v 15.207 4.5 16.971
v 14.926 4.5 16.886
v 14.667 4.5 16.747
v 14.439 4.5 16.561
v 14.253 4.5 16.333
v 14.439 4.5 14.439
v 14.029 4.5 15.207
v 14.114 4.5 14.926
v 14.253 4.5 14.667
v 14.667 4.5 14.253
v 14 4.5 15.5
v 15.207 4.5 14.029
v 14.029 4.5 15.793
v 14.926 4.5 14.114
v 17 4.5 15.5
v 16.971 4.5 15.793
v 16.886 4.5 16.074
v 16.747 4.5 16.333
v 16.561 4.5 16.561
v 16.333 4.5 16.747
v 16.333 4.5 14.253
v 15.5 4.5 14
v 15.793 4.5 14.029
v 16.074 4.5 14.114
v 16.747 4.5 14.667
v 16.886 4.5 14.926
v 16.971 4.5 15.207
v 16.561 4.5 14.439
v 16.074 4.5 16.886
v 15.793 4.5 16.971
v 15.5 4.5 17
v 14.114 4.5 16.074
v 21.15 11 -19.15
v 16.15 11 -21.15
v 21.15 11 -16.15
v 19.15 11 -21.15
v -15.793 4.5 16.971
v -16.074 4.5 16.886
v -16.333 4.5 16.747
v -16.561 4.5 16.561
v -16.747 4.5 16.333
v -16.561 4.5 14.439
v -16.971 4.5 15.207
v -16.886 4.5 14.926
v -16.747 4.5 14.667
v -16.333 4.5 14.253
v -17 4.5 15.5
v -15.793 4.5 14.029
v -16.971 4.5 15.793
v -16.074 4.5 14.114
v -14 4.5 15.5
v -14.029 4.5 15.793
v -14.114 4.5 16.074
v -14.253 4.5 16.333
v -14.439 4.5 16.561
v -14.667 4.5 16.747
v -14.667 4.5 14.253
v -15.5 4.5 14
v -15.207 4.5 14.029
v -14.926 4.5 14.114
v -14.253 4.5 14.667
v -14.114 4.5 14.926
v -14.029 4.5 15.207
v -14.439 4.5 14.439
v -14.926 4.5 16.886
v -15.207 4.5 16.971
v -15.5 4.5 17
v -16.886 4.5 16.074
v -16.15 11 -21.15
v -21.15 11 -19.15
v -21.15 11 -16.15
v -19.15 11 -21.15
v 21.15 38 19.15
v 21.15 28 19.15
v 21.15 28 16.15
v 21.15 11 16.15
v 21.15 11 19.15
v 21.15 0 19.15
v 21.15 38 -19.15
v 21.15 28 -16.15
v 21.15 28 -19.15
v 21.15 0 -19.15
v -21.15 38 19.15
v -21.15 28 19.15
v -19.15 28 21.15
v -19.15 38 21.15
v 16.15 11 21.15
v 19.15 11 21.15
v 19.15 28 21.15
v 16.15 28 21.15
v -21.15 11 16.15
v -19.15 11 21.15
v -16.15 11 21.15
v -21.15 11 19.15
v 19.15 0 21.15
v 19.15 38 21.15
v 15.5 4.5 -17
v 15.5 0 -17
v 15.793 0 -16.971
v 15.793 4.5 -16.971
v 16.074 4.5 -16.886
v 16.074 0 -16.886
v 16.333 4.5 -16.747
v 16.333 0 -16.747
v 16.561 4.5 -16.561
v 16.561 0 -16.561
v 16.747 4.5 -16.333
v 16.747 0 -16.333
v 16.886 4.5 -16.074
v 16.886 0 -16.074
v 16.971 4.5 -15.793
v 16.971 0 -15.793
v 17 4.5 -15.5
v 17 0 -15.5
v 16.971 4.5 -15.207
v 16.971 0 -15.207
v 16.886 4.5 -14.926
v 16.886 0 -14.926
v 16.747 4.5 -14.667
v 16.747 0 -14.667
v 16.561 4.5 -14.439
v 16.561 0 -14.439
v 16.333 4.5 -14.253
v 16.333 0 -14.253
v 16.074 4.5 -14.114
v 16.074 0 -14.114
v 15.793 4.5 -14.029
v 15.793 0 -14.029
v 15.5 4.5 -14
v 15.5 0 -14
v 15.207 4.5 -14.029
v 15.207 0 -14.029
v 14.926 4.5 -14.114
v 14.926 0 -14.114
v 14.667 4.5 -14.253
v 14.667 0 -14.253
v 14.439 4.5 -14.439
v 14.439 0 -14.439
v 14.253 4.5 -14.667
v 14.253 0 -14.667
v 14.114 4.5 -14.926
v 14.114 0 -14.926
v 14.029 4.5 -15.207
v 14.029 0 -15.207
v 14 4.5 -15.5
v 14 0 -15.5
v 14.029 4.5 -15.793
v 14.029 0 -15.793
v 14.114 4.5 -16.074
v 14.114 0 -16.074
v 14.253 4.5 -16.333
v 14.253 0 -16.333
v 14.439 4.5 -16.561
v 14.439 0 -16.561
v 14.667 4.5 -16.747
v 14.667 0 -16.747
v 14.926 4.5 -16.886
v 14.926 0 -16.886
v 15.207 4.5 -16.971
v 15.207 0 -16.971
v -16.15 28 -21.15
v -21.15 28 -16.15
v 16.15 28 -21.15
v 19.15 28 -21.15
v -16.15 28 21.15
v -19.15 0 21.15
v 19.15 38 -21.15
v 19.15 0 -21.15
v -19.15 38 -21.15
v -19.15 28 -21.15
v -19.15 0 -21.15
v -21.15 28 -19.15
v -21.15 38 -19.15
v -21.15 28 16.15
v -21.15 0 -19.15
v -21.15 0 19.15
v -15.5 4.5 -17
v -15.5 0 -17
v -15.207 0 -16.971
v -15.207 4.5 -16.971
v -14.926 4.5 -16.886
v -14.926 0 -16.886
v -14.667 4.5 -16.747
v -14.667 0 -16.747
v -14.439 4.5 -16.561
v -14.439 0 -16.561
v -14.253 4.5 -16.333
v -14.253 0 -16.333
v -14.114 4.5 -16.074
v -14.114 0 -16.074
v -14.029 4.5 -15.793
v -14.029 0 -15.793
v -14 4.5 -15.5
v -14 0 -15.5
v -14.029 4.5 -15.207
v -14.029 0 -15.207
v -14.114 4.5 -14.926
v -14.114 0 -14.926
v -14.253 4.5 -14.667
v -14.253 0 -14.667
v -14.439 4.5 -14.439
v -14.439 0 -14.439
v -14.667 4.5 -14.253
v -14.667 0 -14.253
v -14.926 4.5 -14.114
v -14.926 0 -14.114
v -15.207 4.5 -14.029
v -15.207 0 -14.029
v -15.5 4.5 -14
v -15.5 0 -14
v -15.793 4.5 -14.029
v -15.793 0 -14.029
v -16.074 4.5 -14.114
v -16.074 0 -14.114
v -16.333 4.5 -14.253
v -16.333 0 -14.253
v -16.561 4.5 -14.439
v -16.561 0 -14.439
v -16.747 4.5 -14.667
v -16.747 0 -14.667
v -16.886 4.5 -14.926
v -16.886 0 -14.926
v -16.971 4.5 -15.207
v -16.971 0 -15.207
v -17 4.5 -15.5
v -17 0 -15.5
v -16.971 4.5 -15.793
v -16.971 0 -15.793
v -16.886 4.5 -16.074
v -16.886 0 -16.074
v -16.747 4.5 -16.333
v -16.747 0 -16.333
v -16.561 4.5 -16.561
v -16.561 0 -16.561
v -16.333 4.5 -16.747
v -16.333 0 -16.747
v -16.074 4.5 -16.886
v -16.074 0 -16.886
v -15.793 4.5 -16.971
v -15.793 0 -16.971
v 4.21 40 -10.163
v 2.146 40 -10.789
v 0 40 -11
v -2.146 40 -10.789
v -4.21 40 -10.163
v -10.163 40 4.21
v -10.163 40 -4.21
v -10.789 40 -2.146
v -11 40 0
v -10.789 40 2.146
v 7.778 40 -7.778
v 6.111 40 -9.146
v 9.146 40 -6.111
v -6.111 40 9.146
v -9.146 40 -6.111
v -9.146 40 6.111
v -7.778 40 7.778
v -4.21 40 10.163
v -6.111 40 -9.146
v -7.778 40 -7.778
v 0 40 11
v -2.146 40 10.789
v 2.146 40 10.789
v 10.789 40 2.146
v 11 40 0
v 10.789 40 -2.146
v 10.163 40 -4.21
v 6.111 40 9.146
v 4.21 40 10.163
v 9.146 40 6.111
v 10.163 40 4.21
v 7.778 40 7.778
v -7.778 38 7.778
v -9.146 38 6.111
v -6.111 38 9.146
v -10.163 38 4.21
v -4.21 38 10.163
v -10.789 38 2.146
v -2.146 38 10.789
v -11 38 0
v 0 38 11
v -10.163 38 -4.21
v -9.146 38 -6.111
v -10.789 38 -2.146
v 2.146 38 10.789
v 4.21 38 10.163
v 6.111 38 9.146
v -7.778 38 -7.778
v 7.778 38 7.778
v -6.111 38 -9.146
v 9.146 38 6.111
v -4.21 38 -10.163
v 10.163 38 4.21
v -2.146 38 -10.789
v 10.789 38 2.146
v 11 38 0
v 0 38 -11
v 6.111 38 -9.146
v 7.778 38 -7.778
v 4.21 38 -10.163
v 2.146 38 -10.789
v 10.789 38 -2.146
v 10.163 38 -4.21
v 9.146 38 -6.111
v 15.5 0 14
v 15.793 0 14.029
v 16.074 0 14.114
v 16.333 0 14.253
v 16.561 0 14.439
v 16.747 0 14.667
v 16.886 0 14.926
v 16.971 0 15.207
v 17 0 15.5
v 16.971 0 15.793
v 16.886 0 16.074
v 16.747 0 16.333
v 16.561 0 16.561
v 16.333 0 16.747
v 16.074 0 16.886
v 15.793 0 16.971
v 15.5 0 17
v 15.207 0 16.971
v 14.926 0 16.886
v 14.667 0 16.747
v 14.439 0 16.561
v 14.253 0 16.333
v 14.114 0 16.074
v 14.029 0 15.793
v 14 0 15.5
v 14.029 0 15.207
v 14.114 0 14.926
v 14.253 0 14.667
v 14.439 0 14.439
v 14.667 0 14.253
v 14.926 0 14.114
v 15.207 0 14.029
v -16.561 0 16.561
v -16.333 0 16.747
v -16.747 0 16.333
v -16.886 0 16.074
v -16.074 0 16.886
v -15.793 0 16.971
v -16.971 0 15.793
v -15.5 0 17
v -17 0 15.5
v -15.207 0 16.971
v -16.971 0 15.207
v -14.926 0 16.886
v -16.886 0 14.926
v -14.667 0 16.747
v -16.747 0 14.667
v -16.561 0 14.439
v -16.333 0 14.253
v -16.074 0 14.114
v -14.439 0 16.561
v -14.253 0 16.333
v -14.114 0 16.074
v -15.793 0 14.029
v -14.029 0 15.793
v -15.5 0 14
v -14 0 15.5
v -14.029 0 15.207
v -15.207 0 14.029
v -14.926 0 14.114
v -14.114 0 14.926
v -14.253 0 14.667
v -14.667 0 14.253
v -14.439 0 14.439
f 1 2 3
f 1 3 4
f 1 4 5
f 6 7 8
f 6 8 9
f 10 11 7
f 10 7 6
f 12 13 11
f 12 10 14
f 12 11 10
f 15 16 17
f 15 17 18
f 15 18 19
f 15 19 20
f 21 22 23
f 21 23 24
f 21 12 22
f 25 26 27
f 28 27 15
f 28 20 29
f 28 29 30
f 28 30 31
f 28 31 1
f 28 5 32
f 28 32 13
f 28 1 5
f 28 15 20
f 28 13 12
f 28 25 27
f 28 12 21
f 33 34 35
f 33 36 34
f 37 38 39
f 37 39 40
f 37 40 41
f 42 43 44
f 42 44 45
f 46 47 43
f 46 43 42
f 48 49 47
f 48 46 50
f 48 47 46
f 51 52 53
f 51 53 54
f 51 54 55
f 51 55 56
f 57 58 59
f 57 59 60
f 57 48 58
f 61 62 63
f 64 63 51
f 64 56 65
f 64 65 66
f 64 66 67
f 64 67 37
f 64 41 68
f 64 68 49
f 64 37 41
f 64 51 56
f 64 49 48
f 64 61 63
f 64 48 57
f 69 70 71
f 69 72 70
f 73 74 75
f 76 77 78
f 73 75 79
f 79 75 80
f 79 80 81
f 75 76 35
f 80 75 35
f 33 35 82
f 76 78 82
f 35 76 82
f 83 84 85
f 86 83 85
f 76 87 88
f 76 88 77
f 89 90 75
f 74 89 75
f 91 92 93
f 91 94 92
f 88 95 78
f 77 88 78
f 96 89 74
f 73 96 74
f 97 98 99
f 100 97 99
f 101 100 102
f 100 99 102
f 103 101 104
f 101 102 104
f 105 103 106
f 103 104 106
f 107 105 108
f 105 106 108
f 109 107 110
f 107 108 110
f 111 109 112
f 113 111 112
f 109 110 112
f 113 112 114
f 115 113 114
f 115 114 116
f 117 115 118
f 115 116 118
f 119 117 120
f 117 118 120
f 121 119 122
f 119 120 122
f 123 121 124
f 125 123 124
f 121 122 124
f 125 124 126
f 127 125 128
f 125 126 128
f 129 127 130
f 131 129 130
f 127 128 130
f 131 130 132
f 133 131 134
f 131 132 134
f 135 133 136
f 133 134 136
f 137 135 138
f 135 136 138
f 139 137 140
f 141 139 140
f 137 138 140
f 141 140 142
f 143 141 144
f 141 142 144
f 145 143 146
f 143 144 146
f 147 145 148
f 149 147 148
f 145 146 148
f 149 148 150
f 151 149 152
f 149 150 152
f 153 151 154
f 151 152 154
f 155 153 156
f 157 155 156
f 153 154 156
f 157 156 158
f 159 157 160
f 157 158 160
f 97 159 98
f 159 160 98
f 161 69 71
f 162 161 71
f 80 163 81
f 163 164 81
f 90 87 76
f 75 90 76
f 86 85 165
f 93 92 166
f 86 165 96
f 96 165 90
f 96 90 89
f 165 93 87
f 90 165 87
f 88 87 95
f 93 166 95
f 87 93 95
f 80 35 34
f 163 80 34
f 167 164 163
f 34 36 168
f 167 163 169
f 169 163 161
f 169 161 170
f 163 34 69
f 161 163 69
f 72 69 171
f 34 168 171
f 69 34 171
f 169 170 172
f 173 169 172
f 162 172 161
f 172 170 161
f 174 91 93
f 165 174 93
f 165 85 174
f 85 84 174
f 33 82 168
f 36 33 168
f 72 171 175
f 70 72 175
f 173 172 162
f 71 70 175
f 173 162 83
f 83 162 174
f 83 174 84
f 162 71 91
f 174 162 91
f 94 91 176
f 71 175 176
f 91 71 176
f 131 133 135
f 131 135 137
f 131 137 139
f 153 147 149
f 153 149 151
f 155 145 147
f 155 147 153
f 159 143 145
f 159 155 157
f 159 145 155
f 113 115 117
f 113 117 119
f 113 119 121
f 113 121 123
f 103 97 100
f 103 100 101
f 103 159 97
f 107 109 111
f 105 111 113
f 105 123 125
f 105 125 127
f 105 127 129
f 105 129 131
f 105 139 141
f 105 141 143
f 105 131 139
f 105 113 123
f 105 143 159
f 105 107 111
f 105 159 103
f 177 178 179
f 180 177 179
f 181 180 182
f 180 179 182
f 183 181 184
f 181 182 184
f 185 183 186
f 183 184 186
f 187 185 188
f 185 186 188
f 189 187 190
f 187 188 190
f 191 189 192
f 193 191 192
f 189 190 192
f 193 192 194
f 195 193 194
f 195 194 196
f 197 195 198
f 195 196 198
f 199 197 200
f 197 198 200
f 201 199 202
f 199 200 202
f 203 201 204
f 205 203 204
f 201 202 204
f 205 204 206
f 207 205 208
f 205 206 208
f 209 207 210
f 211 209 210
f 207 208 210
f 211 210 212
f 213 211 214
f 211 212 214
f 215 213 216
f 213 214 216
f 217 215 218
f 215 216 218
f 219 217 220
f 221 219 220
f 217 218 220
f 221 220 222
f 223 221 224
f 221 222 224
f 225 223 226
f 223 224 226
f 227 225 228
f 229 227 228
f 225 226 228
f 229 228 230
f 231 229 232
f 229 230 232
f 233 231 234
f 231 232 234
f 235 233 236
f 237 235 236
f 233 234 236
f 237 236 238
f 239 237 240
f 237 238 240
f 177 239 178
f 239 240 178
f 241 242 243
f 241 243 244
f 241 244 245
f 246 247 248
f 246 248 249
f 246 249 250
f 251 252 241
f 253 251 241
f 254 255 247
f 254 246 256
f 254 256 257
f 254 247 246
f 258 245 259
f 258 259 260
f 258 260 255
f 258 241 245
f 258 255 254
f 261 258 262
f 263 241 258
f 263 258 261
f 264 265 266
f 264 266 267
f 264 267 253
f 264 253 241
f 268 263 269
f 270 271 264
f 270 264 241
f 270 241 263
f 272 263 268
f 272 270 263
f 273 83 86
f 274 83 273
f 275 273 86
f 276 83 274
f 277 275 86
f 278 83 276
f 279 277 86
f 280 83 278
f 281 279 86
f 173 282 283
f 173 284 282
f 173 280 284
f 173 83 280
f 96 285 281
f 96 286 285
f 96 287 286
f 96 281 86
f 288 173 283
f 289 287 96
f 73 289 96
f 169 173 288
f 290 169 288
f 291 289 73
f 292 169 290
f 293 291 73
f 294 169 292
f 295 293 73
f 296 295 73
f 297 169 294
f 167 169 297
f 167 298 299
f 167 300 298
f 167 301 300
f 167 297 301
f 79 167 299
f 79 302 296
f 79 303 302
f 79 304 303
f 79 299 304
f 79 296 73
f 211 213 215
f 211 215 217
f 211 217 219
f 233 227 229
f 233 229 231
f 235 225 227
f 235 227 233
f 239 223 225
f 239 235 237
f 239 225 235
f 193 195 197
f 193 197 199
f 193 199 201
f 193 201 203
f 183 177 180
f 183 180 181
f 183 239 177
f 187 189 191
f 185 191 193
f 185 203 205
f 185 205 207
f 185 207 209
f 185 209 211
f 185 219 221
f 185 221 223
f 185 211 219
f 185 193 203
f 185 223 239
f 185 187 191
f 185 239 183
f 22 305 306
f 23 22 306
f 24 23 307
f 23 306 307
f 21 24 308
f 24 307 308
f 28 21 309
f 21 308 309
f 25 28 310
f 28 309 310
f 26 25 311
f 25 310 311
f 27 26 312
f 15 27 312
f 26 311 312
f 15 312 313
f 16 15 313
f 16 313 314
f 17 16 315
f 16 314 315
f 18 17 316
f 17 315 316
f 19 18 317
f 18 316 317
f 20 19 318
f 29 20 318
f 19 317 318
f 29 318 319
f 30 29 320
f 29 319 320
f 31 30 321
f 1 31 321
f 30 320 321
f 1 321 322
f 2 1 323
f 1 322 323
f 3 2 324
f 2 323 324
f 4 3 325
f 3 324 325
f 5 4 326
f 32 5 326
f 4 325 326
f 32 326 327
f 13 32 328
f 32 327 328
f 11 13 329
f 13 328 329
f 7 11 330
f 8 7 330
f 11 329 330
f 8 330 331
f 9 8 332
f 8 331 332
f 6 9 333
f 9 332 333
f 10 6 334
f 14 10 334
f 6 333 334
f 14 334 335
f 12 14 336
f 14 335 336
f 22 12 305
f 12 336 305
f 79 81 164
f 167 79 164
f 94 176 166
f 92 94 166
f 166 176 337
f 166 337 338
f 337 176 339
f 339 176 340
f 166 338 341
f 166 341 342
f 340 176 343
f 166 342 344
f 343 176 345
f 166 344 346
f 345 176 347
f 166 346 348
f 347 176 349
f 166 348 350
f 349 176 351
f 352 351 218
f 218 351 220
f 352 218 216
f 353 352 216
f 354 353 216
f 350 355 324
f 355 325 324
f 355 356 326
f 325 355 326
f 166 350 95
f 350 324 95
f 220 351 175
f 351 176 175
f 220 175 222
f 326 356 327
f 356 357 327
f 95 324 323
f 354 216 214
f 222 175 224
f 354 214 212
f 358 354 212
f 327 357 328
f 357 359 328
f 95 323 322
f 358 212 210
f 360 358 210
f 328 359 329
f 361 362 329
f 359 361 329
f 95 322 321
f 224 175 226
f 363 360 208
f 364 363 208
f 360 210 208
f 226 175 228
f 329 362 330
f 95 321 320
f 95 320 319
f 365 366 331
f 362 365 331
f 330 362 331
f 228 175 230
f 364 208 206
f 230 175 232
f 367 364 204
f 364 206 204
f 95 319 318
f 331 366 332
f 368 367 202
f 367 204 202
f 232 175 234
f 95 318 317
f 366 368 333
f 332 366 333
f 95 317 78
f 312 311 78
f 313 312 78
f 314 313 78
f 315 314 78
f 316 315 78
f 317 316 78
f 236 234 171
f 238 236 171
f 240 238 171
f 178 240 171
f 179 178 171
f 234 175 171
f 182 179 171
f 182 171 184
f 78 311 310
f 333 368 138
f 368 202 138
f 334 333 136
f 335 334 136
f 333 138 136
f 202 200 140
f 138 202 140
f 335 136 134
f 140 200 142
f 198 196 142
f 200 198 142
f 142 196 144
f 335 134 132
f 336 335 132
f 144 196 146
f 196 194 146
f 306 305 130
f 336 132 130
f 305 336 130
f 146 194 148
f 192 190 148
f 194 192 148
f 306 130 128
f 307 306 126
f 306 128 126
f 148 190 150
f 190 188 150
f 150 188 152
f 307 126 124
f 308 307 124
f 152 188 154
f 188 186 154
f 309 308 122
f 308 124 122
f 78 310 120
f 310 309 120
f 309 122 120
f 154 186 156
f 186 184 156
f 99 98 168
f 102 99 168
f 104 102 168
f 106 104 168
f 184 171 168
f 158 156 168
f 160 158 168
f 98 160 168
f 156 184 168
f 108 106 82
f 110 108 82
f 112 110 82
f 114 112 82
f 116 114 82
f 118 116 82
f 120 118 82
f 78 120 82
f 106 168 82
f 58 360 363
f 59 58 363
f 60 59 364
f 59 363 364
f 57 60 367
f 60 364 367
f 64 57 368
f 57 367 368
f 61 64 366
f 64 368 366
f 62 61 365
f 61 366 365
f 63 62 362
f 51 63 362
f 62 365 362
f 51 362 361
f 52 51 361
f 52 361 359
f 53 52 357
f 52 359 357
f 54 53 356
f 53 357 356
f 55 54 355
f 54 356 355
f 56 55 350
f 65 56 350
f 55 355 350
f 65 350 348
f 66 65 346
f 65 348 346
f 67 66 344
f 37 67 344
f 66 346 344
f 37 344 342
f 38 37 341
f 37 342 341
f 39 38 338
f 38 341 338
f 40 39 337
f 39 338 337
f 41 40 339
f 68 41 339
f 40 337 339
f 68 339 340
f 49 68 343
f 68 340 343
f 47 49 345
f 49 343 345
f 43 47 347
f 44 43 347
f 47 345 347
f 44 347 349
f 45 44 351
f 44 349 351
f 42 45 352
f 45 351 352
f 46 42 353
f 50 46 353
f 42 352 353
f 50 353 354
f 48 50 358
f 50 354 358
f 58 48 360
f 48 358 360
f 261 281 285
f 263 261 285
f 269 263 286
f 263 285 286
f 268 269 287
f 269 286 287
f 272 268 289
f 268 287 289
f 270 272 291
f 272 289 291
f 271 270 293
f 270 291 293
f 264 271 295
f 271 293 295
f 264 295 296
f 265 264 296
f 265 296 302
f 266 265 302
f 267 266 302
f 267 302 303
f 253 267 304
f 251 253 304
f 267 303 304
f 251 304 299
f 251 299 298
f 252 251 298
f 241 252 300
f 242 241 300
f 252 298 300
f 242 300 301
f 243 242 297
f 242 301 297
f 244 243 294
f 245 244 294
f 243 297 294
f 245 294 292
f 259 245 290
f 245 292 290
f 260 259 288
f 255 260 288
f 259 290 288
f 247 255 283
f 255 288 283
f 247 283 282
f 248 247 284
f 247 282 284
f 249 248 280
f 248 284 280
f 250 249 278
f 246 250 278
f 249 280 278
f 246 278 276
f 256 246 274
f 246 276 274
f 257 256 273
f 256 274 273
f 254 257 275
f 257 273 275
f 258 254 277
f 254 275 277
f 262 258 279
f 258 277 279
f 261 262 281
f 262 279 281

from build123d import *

# Parameters (mm, degrees)
BOSS_EXTRUDE1_DEPTH = 11
BOSS_EXTRUDE2_DEPTH = 17
BOSS_EXTRUDE3_DEPTH = 10
SKETCH4_R           = 11
BOSS_EXTRUDE4_DEPTH = 2
SKETCH8_R           = 1.5
CUT_EXTRUDE2_DEPTH  = 4.5


with BuildPart() as part:
    # Sketch1 → Boss-Extrude1 (new body)
    with BuildSketch(Plane(origin=(0, 0, 0), x_dir=(1, 0, 0), z_dir=(0, 1, 0))):
        Polygon((19.15, -21.15), (21.15, -19.15), (21.15, 19.15), (19.15, 21.15), (-19.15, 21.15), (-21.15, 19.15), (-21.15, -19.15), (-19.15, -21.15), align=None)
    extrude(amount=BOSS_EXTRUDE1_DEPTH)

    # Sketch2 → Boss-Extrude2 (add)
    with BuildSketch(Plane(origin=(0, 11, 0), x_dir=(1, 0, 0), z_dir=(0, 1, 0))):
        Polygon((16.15, -21.15), (21.15, -16.15), (21.15, 16.15), (16.15, 21.15), (-16.15, 21.15), (-21.15, 16.15), (-21.15, -16.15), (-16.15, -21.15), align=None)
    extrude(amount=BOSS_EXTRUDE2_DEPTH)

    # Sketch3 → Boss-Extrude3 (add)
    with BuildSketch(Plane(origin=(0, 28, 0), x_dir=(1, 0, 0), z_dir=(0, 1, 0))):
        Polygon((19.15, -21.15), (21.15, -19.15), (21.15, 19.15), (19.15, 21.15), (-19.15, 21.15), (-21.15, 19.15), (-21.15, -19.15), (-19.15, -21.15), align=None)
    extrude(amount=BOSS_EXTRUDE3_DEPTH)

    # Sketch4 → Boss-Extrude4 (add)
    with BuildSketch(Plane(origin=(0, 38, 0), x_dir=(1, 0, 0), z_dir=(0, 1, 0))):
        with Locations(Location((0, 0, 0), (0, 0, 270))):
            Circle(SKETCH4_R)
    extrude(amount=BOSS_EXTRUDE4_DEPTH)

    # Sketch8 → Cut-Extrude2 (cut)
    with BuildSketch(Plane.XZ):
        with Locations(Location((-15.5, 15.5, 0), (0, 0, 270))):
            Circle(SKETCH8_R)
        with Locations(Location((15.5, 15.5, 0), (0, 0, 270))):
            Circle(SKETCH8_R)
        with Locations(Location((15.5, -15.5, 0), (0, 0, 270))):
            Circle(SKETCH8_R)
        with Locations(Location((-15.5, -15.5, 0), (0, 0, 270))):
            Circle(SKETCH8_R)
    extrude(amount=-CUT_EXTRUDE2_DEPTH, mode=Mode.SUBTRACT)


solid = part.part
